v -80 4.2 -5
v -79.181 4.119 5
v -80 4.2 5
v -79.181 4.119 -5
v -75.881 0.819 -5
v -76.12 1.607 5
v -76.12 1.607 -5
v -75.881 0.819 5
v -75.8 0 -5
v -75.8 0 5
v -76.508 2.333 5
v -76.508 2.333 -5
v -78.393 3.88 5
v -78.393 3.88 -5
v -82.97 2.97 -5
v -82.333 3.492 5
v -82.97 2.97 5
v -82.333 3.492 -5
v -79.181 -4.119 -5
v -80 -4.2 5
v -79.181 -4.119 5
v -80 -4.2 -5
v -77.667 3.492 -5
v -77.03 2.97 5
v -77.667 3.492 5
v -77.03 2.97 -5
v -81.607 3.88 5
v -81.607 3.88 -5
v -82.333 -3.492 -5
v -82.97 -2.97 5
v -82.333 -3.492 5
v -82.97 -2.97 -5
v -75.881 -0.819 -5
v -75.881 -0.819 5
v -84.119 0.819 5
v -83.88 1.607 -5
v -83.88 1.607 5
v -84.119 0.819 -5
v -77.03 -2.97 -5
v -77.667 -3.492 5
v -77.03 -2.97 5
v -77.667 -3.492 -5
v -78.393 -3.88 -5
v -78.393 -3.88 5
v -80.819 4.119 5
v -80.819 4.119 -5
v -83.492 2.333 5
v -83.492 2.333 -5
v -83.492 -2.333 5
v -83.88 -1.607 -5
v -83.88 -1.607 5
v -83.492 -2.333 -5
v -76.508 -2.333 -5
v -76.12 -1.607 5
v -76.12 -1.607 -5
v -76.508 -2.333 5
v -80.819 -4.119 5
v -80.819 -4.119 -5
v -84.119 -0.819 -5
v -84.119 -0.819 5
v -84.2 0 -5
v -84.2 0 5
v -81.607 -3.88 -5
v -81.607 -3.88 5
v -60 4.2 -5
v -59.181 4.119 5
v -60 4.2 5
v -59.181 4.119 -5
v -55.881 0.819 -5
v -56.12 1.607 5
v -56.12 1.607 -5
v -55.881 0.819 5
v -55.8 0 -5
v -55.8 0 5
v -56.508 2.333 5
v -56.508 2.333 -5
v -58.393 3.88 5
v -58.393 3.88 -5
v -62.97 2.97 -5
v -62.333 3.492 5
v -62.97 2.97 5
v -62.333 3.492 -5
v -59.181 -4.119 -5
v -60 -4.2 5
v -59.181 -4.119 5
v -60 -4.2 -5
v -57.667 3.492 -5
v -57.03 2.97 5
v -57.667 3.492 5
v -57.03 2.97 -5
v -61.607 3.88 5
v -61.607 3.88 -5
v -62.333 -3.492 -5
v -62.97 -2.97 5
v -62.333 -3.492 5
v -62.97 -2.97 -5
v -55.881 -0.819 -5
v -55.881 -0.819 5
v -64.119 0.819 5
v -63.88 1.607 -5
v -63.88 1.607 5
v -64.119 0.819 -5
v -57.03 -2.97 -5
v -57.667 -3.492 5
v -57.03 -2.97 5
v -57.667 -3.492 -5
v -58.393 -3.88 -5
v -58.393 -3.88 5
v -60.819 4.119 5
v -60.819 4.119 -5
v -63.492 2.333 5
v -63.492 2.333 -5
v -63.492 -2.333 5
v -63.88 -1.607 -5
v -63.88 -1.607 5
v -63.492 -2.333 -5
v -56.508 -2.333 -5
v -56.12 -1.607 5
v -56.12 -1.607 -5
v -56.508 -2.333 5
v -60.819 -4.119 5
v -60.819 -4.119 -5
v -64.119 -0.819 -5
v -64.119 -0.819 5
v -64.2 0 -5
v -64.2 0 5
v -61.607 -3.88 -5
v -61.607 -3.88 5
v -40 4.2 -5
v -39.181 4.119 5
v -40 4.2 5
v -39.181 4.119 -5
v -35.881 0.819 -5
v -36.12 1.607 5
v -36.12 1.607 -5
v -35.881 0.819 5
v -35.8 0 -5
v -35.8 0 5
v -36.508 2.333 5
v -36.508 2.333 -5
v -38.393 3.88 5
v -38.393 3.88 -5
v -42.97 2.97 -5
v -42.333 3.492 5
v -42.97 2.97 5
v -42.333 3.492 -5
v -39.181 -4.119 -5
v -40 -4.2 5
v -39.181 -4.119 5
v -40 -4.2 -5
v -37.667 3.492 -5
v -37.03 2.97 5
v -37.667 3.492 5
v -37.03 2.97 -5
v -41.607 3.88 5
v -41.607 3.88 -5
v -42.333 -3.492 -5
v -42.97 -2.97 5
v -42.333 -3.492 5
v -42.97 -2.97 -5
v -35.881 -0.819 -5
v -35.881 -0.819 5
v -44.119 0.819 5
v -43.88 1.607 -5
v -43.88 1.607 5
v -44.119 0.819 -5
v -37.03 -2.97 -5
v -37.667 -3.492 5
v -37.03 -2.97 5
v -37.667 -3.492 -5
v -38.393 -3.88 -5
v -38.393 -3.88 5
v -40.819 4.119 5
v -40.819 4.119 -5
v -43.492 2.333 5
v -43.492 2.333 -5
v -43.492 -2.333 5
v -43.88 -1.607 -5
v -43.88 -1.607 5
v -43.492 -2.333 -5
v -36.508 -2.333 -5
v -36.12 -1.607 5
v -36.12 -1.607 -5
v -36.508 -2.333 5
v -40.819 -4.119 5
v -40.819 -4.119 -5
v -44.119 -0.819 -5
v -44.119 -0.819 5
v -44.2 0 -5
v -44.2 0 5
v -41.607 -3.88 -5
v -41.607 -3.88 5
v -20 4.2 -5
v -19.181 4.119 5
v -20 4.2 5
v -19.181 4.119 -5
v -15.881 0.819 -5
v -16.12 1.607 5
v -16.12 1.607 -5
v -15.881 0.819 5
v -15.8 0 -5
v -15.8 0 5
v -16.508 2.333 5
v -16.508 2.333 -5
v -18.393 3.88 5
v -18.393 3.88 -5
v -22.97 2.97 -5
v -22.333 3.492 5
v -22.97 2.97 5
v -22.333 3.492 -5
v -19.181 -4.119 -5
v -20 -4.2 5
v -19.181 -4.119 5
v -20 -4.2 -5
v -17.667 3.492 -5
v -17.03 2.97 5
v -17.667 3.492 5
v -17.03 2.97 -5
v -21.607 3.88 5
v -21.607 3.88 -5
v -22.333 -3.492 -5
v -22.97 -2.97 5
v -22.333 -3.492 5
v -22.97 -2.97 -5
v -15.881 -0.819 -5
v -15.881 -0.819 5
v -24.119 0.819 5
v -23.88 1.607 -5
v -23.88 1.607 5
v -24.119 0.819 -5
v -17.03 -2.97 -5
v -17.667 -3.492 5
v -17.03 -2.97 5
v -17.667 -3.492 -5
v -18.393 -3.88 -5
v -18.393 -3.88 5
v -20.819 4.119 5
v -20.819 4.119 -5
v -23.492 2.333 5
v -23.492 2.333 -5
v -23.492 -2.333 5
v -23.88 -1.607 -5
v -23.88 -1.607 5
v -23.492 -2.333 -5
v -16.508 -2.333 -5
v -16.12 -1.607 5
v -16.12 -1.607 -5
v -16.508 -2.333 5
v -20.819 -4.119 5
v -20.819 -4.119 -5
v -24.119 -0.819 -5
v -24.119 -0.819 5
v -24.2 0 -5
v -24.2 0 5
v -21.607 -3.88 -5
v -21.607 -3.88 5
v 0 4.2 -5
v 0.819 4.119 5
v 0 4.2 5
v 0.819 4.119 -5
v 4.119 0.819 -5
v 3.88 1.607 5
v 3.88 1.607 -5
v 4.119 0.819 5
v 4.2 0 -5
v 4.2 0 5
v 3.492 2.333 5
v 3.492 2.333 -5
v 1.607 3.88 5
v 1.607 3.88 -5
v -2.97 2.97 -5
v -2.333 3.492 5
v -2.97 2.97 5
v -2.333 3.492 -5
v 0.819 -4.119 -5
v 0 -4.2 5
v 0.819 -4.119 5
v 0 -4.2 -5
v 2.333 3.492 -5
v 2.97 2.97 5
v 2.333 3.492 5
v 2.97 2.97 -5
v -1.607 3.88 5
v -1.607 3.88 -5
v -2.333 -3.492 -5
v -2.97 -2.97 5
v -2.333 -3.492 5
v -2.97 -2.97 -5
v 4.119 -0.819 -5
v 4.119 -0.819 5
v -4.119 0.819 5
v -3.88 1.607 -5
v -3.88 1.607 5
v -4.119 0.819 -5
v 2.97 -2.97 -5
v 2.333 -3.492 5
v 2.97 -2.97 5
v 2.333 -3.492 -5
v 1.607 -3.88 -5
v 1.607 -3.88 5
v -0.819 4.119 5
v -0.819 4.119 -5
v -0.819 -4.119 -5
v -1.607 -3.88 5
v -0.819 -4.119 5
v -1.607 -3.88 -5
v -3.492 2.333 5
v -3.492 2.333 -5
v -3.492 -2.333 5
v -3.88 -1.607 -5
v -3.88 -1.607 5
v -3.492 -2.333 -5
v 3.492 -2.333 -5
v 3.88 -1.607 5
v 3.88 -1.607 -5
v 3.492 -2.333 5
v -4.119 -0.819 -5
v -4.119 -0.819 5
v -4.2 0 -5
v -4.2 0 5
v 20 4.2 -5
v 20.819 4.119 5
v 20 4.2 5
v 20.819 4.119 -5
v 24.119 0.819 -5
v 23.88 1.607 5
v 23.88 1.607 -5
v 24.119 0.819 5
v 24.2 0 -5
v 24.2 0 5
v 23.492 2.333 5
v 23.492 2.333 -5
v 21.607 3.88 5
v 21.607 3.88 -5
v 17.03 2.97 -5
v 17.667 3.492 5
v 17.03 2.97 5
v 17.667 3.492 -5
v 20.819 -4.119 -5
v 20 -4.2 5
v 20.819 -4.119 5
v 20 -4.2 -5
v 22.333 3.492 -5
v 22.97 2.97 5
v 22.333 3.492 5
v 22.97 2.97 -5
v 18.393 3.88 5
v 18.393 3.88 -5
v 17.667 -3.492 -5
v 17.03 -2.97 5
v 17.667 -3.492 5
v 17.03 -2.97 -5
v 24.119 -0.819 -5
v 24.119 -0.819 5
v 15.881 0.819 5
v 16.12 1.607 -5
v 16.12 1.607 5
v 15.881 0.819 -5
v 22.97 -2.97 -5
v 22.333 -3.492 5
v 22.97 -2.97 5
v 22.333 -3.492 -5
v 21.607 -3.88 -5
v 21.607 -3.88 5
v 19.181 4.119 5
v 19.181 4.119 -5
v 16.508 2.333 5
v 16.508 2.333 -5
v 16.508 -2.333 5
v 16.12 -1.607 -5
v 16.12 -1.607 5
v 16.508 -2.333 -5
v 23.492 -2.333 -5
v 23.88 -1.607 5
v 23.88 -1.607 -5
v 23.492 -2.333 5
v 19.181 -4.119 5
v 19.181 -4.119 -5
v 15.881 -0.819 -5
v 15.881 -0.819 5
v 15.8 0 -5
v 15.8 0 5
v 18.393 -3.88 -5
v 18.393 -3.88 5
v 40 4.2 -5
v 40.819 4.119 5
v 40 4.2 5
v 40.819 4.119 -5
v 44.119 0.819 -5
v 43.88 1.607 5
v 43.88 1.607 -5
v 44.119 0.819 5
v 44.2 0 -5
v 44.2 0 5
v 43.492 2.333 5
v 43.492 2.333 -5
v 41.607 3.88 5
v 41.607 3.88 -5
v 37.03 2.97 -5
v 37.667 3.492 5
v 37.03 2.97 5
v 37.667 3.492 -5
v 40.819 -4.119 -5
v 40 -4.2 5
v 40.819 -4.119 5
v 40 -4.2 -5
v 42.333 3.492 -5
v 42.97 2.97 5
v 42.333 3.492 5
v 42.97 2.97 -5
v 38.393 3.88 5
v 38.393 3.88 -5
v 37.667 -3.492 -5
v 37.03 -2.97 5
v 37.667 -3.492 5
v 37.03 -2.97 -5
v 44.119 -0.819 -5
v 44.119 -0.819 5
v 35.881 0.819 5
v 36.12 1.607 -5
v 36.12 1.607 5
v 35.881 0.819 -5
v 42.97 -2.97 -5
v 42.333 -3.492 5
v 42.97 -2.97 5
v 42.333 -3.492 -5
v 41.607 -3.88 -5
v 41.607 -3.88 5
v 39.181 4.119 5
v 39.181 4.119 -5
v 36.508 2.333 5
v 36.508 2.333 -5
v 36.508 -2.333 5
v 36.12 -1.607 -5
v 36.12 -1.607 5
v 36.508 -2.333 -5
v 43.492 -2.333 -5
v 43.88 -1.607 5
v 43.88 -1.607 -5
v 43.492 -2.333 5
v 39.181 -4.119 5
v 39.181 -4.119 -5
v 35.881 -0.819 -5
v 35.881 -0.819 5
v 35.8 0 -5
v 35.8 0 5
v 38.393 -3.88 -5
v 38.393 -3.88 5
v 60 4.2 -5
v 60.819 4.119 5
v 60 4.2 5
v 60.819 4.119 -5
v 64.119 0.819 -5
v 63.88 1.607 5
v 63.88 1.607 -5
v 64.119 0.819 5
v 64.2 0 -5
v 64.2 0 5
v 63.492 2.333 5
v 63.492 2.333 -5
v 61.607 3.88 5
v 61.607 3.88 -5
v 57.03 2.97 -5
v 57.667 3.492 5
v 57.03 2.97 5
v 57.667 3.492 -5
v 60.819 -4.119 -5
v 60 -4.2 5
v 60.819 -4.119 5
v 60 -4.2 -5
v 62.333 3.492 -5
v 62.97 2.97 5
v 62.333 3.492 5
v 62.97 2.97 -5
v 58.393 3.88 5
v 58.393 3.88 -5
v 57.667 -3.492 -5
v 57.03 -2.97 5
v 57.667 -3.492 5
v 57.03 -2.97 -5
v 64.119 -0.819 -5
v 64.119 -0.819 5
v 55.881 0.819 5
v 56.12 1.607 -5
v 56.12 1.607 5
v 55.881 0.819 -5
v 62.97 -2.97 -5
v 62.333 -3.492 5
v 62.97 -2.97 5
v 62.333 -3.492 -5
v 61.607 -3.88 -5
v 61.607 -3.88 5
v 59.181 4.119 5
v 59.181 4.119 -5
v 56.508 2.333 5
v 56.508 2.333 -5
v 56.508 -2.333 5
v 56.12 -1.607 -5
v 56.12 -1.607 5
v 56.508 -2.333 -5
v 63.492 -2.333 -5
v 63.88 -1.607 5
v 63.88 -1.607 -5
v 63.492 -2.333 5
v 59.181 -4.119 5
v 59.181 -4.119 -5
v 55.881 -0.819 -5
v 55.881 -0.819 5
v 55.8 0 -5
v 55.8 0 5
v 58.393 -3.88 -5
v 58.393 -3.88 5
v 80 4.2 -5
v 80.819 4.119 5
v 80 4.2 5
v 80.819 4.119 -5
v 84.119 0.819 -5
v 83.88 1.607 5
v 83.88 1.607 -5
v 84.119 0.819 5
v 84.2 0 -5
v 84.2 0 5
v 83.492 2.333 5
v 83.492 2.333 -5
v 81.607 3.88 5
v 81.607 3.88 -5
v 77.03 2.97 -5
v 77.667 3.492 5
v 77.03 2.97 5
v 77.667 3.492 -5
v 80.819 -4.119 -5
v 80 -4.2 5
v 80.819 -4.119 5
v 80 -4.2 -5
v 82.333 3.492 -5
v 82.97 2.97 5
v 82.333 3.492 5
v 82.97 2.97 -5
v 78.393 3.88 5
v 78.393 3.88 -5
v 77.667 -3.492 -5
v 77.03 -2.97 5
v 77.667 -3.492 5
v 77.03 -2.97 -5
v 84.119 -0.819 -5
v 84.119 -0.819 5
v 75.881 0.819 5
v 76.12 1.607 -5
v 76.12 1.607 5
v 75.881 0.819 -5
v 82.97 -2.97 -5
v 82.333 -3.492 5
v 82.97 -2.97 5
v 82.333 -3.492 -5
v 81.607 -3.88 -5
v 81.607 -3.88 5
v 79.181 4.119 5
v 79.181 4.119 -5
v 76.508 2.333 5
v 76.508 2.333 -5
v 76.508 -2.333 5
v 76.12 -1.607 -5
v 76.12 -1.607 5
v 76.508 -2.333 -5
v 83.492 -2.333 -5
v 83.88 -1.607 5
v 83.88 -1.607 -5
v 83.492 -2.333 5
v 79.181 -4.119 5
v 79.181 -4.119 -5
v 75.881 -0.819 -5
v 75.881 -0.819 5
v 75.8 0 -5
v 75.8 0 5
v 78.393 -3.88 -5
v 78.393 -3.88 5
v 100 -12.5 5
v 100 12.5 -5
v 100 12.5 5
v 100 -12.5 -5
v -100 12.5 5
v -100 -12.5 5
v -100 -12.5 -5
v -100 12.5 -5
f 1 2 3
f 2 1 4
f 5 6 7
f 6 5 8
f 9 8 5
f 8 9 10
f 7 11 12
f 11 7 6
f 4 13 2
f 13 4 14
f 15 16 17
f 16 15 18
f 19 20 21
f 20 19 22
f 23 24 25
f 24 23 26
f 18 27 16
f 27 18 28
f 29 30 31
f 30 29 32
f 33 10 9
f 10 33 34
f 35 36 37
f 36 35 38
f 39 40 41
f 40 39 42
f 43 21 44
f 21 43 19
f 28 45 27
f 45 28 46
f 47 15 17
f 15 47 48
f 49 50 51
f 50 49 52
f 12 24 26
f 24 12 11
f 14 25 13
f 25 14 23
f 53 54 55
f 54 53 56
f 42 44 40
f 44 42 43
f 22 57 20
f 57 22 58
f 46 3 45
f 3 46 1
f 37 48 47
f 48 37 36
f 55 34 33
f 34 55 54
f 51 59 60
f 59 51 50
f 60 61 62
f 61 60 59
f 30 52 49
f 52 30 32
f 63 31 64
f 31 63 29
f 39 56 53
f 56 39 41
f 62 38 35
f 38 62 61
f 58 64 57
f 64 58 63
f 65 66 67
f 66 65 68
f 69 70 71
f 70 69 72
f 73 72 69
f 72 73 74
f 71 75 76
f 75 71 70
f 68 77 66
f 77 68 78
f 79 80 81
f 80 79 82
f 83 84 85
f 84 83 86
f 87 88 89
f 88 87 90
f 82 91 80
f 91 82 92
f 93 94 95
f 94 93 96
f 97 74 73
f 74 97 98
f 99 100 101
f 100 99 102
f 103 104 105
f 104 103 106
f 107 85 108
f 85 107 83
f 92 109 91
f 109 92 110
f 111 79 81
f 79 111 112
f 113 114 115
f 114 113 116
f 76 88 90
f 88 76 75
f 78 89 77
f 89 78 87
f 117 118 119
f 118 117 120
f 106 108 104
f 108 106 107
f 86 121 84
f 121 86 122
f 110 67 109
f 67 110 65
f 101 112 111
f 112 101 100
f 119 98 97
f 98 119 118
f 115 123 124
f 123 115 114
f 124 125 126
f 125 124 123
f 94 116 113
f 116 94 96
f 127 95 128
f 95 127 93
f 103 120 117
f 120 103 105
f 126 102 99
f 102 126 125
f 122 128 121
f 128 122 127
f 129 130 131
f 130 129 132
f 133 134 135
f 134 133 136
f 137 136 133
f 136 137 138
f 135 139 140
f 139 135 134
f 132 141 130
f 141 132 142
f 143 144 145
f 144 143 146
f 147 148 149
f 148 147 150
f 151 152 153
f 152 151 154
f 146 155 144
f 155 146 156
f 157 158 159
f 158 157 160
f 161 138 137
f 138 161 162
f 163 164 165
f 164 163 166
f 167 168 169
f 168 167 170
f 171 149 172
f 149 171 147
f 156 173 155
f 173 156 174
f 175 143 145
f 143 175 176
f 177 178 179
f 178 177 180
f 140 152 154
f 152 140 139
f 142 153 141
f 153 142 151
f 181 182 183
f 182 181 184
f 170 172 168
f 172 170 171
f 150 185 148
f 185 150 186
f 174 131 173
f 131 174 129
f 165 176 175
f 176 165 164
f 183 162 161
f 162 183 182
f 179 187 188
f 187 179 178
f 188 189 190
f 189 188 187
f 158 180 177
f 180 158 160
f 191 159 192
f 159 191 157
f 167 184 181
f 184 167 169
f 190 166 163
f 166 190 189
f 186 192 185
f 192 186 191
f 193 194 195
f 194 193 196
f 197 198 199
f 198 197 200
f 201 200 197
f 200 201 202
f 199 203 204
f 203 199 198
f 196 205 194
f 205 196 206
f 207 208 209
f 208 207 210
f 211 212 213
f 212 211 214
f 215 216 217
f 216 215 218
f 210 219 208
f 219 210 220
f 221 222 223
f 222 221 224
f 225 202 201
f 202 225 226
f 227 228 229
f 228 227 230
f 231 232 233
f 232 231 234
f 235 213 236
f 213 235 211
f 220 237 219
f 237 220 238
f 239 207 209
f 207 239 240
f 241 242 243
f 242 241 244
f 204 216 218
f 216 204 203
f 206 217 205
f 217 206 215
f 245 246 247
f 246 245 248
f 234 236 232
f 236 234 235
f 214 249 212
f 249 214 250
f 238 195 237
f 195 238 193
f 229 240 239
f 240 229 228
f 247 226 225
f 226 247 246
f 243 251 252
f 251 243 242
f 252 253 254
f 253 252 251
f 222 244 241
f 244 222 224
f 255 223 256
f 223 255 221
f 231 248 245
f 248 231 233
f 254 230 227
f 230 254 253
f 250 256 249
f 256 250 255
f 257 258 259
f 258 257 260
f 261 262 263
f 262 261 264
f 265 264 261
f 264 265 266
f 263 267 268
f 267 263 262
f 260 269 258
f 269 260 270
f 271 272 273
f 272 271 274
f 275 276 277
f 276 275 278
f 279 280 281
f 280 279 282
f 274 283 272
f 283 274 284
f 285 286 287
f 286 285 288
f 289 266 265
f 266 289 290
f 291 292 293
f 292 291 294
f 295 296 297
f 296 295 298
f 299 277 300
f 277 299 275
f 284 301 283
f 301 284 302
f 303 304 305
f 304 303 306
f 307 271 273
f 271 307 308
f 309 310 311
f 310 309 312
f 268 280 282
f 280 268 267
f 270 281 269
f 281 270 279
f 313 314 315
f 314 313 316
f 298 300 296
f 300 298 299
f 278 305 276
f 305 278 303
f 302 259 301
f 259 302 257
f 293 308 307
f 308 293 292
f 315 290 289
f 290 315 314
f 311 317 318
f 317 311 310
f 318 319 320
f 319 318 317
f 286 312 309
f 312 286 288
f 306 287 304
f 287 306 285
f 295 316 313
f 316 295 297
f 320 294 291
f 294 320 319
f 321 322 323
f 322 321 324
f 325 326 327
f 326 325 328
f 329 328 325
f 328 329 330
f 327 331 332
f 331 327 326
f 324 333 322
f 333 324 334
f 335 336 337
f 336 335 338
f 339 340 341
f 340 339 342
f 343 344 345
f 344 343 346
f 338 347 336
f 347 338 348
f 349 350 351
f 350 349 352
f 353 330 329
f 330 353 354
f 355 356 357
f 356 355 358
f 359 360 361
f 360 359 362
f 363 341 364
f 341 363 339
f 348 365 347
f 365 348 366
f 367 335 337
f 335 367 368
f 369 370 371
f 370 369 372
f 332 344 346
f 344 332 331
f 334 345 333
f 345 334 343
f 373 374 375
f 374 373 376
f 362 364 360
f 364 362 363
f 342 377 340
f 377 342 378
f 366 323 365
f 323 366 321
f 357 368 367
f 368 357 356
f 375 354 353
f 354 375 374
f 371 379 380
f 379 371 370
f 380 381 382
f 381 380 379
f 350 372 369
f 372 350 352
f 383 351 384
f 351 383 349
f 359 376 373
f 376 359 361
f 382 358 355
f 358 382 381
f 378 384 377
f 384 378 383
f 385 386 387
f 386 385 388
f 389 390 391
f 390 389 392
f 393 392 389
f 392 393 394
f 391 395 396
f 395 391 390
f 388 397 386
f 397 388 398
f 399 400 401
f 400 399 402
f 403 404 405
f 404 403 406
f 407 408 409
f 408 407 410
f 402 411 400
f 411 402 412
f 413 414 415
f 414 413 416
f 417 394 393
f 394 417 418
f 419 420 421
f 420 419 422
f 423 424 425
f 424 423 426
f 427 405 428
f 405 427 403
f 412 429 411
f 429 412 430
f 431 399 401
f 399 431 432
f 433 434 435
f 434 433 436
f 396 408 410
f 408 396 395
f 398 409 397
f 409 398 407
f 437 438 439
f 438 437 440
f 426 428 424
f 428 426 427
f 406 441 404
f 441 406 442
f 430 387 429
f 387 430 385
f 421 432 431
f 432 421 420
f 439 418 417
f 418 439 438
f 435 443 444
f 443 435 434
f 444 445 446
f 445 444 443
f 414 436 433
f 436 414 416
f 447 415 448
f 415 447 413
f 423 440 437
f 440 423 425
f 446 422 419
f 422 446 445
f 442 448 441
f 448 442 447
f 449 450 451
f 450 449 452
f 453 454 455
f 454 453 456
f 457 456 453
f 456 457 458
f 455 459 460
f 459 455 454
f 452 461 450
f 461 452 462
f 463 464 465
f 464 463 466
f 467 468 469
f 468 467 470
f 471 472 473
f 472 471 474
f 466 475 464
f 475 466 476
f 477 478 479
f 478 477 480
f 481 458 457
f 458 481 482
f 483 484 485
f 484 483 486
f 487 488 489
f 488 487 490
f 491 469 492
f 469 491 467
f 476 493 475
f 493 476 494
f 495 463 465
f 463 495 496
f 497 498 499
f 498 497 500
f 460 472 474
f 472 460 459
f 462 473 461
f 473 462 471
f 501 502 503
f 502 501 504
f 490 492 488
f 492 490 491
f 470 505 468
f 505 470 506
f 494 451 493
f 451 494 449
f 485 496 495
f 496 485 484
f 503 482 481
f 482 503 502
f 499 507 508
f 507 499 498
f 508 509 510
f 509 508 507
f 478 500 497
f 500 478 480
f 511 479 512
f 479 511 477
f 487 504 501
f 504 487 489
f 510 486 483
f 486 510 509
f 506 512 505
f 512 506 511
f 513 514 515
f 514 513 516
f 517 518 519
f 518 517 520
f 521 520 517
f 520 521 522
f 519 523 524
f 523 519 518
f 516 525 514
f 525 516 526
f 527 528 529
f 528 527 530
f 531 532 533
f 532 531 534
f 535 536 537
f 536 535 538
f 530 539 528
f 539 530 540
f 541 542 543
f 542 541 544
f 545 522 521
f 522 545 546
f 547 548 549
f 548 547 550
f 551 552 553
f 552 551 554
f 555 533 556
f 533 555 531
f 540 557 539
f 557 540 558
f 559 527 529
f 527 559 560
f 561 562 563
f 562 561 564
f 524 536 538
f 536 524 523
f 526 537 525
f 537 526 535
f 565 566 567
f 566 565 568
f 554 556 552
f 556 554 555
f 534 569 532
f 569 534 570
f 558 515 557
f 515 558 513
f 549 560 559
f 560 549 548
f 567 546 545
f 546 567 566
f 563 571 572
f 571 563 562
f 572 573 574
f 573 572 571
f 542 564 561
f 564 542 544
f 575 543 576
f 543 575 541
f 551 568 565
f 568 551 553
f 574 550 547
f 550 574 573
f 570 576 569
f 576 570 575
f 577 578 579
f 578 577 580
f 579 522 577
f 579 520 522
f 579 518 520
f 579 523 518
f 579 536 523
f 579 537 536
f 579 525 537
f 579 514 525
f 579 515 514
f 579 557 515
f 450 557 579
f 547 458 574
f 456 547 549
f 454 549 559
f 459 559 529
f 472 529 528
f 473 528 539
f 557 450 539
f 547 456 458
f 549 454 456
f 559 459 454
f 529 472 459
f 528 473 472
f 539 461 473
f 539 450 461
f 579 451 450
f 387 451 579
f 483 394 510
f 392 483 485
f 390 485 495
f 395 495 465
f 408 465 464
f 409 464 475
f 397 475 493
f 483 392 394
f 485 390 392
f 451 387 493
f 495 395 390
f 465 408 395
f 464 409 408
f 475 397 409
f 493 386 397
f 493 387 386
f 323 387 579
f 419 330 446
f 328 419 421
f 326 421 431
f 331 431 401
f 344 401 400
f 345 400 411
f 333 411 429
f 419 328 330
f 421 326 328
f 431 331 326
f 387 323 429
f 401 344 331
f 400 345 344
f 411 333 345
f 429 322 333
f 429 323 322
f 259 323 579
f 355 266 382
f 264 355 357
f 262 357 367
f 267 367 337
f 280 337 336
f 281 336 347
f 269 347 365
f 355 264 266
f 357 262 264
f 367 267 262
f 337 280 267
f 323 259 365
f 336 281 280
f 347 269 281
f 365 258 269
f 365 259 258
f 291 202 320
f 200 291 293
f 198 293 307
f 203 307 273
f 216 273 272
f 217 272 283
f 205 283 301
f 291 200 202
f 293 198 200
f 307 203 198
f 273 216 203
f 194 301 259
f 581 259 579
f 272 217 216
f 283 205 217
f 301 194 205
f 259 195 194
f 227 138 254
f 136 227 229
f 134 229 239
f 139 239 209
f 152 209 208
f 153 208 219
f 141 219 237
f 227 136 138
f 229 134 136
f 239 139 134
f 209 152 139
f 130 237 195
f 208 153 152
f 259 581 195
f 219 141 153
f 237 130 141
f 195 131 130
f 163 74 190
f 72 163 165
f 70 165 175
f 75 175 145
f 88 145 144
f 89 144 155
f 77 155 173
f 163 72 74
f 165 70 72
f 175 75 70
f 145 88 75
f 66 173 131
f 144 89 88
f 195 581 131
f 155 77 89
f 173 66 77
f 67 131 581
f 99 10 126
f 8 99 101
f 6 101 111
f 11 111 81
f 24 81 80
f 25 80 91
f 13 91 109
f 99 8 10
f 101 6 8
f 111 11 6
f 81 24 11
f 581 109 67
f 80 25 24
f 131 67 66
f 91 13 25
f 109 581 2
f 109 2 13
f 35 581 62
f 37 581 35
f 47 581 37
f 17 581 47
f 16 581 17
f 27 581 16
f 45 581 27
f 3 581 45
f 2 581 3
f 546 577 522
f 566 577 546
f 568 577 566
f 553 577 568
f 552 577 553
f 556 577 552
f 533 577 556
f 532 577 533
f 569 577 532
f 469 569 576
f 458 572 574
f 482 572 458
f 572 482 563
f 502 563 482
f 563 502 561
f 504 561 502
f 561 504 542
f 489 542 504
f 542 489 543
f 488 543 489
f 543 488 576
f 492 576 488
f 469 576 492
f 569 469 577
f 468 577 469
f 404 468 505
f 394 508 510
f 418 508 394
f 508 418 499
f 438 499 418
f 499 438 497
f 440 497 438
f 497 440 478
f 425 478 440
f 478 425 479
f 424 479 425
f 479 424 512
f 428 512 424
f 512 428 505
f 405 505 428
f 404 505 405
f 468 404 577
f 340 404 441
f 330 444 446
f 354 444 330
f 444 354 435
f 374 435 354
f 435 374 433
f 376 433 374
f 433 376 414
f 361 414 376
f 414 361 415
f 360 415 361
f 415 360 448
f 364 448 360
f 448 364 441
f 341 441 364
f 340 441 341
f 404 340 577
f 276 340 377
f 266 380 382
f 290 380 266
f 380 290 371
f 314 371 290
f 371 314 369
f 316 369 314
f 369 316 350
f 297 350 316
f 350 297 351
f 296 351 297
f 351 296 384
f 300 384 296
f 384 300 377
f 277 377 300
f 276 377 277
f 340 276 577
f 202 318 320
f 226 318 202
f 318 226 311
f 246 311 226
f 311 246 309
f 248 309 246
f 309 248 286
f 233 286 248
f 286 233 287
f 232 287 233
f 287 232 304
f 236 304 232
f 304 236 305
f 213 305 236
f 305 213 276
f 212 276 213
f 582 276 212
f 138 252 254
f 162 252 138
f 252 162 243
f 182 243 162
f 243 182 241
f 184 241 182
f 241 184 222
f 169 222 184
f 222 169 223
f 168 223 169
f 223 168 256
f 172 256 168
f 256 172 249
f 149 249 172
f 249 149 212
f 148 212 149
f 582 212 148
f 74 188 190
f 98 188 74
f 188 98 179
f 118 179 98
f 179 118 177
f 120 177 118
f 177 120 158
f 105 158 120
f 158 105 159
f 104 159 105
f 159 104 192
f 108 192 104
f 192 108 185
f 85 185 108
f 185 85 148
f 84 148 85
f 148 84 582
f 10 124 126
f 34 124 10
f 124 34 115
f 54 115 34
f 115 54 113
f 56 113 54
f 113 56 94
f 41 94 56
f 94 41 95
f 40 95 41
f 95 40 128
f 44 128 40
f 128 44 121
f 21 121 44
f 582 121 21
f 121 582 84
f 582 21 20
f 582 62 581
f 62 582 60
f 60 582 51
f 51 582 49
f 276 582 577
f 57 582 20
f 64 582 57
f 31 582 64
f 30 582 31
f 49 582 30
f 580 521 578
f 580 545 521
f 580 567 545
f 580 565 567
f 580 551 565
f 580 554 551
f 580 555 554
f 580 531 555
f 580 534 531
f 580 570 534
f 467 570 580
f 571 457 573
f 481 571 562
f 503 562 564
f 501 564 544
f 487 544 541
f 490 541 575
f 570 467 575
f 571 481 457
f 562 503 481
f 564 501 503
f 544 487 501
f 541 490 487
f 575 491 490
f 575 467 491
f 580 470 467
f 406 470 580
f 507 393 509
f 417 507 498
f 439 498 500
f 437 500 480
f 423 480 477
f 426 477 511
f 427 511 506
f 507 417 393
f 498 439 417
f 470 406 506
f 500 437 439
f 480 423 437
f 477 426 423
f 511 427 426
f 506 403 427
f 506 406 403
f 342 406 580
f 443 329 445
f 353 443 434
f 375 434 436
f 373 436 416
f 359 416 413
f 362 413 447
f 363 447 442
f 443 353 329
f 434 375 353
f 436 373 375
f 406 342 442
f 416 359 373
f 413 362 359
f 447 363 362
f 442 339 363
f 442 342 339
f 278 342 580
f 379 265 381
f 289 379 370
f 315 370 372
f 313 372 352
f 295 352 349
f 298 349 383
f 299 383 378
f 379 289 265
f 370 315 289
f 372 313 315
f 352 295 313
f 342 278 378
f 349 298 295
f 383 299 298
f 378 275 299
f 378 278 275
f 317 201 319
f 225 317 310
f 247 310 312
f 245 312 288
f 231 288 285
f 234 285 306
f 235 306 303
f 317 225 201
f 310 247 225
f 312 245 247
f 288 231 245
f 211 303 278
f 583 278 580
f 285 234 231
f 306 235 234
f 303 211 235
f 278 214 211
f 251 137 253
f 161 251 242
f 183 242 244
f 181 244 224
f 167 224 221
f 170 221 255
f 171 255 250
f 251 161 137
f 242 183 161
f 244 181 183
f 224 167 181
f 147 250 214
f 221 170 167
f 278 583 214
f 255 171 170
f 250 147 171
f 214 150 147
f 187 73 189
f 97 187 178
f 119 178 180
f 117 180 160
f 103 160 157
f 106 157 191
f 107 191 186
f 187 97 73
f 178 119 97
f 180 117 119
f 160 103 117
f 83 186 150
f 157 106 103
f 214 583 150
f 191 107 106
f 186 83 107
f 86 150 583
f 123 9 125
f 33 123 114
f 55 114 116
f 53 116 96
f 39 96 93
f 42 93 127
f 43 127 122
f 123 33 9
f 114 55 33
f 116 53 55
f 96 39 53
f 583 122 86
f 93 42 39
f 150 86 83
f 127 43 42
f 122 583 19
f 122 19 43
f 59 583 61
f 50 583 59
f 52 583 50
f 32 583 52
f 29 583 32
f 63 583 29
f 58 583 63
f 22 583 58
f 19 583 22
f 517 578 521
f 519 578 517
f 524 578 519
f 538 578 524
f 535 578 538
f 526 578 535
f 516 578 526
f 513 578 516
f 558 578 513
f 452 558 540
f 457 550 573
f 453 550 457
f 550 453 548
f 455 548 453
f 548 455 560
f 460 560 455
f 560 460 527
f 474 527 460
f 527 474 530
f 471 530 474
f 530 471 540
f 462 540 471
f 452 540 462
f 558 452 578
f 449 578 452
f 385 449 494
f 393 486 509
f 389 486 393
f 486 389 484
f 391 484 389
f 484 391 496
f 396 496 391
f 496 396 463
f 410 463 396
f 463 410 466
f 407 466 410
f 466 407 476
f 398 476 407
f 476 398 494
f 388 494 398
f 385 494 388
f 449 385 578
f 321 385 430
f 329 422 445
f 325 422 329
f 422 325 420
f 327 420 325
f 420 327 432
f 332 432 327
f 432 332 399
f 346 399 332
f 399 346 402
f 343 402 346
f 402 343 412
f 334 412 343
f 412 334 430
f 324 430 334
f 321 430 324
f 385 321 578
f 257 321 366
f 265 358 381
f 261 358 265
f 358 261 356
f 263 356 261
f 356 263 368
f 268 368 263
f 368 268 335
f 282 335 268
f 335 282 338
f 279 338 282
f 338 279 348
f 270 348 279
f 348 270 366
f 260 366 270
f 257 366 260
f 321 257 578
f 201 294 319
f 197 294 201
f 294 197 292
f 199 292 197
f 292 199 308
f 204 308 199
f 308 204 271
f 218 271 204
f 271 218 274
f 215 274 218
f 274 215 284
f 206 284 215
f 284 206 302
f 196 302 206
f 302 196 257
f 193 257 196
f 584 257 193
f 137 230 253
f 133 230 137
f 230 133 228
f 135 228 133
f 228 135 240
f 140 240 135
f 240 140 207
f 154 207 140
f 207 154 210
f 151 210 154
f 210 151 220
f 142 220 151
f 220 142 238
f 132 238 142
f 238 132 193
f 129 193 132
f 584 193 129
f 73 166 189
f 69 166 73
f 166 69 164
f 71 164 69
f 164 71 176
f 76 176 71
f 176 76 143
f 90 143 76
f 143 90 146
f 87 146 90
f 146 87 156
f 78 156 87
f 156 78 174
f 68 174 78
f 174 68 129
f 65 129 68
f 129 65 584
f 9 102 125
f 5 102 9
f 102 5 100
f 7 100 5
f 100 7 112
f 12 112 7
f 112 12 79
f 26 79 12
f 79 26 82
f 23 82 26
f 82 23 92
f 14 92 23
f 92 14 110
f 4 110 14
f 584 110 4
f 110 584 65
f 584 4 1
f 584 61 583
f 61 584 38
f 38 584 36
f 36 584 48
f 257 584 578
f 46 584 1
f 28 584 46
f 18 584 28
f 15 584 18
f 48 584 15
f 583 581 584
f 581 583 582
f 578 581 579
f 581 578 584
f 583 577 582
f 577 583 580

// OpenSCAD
$fn = 32;

// ----------------------------------------------------------------------
// Hole bar, 9 x Ø8.4
// skip layout, 20 mm edge offset
// ----------------------------------------------------------------------

// --- parameters (mm) ---
bar_w = 25;       // bar width (Y)
bar_t = 10;       // bar thickness (Z)
holes = 9;        // holes per row
hole_d = 8.4;     // hole diameter
edge = 20;        // offset from the bar end to the first hole
grid_pitch = 10;  // grid the bar was laid out on

// --- derived feature positions (mm) ---
pitch = grid_pitch * 2;       // = 20   holes sit every other grid slot
span = (holes - 1) * pitch;   // = 160   distance between the end holes
bar_l = span + 2 * edge;      // = 200   overall bar length
start_x = -bar_l / 2 + edge;  // = -80   X of the first hole
feature_centers = [
  [start_x + 0 * pitch, 0],
  [start_x + 1 * pitch, 0],
  [start_x + 2 * pitch, 0],
  [start_x + 3 * pitch, 0],
  [start_x + 4 * pitch, 0],
  [start_x + 5 * pitch, 0],
  [start_x + 6 * pitch, 0],
  [start_x + 7 * pitch, 0],
  [start_x + 8 * pitch, 0]
];   // hole centres of the first row

// bar with one row of holes, drilled from feature_centers
difference() {
  translate([-bar_l / 2, -bar_w / 2, -bar_t / 2]) cube([bar_l, bar_w, bar_t]);
  for (centre = feature_centers)
    translate([centre[0], centre[1], 0])
      cylinder(d = hole_d, h = bar_t + 2, center = true);
}
